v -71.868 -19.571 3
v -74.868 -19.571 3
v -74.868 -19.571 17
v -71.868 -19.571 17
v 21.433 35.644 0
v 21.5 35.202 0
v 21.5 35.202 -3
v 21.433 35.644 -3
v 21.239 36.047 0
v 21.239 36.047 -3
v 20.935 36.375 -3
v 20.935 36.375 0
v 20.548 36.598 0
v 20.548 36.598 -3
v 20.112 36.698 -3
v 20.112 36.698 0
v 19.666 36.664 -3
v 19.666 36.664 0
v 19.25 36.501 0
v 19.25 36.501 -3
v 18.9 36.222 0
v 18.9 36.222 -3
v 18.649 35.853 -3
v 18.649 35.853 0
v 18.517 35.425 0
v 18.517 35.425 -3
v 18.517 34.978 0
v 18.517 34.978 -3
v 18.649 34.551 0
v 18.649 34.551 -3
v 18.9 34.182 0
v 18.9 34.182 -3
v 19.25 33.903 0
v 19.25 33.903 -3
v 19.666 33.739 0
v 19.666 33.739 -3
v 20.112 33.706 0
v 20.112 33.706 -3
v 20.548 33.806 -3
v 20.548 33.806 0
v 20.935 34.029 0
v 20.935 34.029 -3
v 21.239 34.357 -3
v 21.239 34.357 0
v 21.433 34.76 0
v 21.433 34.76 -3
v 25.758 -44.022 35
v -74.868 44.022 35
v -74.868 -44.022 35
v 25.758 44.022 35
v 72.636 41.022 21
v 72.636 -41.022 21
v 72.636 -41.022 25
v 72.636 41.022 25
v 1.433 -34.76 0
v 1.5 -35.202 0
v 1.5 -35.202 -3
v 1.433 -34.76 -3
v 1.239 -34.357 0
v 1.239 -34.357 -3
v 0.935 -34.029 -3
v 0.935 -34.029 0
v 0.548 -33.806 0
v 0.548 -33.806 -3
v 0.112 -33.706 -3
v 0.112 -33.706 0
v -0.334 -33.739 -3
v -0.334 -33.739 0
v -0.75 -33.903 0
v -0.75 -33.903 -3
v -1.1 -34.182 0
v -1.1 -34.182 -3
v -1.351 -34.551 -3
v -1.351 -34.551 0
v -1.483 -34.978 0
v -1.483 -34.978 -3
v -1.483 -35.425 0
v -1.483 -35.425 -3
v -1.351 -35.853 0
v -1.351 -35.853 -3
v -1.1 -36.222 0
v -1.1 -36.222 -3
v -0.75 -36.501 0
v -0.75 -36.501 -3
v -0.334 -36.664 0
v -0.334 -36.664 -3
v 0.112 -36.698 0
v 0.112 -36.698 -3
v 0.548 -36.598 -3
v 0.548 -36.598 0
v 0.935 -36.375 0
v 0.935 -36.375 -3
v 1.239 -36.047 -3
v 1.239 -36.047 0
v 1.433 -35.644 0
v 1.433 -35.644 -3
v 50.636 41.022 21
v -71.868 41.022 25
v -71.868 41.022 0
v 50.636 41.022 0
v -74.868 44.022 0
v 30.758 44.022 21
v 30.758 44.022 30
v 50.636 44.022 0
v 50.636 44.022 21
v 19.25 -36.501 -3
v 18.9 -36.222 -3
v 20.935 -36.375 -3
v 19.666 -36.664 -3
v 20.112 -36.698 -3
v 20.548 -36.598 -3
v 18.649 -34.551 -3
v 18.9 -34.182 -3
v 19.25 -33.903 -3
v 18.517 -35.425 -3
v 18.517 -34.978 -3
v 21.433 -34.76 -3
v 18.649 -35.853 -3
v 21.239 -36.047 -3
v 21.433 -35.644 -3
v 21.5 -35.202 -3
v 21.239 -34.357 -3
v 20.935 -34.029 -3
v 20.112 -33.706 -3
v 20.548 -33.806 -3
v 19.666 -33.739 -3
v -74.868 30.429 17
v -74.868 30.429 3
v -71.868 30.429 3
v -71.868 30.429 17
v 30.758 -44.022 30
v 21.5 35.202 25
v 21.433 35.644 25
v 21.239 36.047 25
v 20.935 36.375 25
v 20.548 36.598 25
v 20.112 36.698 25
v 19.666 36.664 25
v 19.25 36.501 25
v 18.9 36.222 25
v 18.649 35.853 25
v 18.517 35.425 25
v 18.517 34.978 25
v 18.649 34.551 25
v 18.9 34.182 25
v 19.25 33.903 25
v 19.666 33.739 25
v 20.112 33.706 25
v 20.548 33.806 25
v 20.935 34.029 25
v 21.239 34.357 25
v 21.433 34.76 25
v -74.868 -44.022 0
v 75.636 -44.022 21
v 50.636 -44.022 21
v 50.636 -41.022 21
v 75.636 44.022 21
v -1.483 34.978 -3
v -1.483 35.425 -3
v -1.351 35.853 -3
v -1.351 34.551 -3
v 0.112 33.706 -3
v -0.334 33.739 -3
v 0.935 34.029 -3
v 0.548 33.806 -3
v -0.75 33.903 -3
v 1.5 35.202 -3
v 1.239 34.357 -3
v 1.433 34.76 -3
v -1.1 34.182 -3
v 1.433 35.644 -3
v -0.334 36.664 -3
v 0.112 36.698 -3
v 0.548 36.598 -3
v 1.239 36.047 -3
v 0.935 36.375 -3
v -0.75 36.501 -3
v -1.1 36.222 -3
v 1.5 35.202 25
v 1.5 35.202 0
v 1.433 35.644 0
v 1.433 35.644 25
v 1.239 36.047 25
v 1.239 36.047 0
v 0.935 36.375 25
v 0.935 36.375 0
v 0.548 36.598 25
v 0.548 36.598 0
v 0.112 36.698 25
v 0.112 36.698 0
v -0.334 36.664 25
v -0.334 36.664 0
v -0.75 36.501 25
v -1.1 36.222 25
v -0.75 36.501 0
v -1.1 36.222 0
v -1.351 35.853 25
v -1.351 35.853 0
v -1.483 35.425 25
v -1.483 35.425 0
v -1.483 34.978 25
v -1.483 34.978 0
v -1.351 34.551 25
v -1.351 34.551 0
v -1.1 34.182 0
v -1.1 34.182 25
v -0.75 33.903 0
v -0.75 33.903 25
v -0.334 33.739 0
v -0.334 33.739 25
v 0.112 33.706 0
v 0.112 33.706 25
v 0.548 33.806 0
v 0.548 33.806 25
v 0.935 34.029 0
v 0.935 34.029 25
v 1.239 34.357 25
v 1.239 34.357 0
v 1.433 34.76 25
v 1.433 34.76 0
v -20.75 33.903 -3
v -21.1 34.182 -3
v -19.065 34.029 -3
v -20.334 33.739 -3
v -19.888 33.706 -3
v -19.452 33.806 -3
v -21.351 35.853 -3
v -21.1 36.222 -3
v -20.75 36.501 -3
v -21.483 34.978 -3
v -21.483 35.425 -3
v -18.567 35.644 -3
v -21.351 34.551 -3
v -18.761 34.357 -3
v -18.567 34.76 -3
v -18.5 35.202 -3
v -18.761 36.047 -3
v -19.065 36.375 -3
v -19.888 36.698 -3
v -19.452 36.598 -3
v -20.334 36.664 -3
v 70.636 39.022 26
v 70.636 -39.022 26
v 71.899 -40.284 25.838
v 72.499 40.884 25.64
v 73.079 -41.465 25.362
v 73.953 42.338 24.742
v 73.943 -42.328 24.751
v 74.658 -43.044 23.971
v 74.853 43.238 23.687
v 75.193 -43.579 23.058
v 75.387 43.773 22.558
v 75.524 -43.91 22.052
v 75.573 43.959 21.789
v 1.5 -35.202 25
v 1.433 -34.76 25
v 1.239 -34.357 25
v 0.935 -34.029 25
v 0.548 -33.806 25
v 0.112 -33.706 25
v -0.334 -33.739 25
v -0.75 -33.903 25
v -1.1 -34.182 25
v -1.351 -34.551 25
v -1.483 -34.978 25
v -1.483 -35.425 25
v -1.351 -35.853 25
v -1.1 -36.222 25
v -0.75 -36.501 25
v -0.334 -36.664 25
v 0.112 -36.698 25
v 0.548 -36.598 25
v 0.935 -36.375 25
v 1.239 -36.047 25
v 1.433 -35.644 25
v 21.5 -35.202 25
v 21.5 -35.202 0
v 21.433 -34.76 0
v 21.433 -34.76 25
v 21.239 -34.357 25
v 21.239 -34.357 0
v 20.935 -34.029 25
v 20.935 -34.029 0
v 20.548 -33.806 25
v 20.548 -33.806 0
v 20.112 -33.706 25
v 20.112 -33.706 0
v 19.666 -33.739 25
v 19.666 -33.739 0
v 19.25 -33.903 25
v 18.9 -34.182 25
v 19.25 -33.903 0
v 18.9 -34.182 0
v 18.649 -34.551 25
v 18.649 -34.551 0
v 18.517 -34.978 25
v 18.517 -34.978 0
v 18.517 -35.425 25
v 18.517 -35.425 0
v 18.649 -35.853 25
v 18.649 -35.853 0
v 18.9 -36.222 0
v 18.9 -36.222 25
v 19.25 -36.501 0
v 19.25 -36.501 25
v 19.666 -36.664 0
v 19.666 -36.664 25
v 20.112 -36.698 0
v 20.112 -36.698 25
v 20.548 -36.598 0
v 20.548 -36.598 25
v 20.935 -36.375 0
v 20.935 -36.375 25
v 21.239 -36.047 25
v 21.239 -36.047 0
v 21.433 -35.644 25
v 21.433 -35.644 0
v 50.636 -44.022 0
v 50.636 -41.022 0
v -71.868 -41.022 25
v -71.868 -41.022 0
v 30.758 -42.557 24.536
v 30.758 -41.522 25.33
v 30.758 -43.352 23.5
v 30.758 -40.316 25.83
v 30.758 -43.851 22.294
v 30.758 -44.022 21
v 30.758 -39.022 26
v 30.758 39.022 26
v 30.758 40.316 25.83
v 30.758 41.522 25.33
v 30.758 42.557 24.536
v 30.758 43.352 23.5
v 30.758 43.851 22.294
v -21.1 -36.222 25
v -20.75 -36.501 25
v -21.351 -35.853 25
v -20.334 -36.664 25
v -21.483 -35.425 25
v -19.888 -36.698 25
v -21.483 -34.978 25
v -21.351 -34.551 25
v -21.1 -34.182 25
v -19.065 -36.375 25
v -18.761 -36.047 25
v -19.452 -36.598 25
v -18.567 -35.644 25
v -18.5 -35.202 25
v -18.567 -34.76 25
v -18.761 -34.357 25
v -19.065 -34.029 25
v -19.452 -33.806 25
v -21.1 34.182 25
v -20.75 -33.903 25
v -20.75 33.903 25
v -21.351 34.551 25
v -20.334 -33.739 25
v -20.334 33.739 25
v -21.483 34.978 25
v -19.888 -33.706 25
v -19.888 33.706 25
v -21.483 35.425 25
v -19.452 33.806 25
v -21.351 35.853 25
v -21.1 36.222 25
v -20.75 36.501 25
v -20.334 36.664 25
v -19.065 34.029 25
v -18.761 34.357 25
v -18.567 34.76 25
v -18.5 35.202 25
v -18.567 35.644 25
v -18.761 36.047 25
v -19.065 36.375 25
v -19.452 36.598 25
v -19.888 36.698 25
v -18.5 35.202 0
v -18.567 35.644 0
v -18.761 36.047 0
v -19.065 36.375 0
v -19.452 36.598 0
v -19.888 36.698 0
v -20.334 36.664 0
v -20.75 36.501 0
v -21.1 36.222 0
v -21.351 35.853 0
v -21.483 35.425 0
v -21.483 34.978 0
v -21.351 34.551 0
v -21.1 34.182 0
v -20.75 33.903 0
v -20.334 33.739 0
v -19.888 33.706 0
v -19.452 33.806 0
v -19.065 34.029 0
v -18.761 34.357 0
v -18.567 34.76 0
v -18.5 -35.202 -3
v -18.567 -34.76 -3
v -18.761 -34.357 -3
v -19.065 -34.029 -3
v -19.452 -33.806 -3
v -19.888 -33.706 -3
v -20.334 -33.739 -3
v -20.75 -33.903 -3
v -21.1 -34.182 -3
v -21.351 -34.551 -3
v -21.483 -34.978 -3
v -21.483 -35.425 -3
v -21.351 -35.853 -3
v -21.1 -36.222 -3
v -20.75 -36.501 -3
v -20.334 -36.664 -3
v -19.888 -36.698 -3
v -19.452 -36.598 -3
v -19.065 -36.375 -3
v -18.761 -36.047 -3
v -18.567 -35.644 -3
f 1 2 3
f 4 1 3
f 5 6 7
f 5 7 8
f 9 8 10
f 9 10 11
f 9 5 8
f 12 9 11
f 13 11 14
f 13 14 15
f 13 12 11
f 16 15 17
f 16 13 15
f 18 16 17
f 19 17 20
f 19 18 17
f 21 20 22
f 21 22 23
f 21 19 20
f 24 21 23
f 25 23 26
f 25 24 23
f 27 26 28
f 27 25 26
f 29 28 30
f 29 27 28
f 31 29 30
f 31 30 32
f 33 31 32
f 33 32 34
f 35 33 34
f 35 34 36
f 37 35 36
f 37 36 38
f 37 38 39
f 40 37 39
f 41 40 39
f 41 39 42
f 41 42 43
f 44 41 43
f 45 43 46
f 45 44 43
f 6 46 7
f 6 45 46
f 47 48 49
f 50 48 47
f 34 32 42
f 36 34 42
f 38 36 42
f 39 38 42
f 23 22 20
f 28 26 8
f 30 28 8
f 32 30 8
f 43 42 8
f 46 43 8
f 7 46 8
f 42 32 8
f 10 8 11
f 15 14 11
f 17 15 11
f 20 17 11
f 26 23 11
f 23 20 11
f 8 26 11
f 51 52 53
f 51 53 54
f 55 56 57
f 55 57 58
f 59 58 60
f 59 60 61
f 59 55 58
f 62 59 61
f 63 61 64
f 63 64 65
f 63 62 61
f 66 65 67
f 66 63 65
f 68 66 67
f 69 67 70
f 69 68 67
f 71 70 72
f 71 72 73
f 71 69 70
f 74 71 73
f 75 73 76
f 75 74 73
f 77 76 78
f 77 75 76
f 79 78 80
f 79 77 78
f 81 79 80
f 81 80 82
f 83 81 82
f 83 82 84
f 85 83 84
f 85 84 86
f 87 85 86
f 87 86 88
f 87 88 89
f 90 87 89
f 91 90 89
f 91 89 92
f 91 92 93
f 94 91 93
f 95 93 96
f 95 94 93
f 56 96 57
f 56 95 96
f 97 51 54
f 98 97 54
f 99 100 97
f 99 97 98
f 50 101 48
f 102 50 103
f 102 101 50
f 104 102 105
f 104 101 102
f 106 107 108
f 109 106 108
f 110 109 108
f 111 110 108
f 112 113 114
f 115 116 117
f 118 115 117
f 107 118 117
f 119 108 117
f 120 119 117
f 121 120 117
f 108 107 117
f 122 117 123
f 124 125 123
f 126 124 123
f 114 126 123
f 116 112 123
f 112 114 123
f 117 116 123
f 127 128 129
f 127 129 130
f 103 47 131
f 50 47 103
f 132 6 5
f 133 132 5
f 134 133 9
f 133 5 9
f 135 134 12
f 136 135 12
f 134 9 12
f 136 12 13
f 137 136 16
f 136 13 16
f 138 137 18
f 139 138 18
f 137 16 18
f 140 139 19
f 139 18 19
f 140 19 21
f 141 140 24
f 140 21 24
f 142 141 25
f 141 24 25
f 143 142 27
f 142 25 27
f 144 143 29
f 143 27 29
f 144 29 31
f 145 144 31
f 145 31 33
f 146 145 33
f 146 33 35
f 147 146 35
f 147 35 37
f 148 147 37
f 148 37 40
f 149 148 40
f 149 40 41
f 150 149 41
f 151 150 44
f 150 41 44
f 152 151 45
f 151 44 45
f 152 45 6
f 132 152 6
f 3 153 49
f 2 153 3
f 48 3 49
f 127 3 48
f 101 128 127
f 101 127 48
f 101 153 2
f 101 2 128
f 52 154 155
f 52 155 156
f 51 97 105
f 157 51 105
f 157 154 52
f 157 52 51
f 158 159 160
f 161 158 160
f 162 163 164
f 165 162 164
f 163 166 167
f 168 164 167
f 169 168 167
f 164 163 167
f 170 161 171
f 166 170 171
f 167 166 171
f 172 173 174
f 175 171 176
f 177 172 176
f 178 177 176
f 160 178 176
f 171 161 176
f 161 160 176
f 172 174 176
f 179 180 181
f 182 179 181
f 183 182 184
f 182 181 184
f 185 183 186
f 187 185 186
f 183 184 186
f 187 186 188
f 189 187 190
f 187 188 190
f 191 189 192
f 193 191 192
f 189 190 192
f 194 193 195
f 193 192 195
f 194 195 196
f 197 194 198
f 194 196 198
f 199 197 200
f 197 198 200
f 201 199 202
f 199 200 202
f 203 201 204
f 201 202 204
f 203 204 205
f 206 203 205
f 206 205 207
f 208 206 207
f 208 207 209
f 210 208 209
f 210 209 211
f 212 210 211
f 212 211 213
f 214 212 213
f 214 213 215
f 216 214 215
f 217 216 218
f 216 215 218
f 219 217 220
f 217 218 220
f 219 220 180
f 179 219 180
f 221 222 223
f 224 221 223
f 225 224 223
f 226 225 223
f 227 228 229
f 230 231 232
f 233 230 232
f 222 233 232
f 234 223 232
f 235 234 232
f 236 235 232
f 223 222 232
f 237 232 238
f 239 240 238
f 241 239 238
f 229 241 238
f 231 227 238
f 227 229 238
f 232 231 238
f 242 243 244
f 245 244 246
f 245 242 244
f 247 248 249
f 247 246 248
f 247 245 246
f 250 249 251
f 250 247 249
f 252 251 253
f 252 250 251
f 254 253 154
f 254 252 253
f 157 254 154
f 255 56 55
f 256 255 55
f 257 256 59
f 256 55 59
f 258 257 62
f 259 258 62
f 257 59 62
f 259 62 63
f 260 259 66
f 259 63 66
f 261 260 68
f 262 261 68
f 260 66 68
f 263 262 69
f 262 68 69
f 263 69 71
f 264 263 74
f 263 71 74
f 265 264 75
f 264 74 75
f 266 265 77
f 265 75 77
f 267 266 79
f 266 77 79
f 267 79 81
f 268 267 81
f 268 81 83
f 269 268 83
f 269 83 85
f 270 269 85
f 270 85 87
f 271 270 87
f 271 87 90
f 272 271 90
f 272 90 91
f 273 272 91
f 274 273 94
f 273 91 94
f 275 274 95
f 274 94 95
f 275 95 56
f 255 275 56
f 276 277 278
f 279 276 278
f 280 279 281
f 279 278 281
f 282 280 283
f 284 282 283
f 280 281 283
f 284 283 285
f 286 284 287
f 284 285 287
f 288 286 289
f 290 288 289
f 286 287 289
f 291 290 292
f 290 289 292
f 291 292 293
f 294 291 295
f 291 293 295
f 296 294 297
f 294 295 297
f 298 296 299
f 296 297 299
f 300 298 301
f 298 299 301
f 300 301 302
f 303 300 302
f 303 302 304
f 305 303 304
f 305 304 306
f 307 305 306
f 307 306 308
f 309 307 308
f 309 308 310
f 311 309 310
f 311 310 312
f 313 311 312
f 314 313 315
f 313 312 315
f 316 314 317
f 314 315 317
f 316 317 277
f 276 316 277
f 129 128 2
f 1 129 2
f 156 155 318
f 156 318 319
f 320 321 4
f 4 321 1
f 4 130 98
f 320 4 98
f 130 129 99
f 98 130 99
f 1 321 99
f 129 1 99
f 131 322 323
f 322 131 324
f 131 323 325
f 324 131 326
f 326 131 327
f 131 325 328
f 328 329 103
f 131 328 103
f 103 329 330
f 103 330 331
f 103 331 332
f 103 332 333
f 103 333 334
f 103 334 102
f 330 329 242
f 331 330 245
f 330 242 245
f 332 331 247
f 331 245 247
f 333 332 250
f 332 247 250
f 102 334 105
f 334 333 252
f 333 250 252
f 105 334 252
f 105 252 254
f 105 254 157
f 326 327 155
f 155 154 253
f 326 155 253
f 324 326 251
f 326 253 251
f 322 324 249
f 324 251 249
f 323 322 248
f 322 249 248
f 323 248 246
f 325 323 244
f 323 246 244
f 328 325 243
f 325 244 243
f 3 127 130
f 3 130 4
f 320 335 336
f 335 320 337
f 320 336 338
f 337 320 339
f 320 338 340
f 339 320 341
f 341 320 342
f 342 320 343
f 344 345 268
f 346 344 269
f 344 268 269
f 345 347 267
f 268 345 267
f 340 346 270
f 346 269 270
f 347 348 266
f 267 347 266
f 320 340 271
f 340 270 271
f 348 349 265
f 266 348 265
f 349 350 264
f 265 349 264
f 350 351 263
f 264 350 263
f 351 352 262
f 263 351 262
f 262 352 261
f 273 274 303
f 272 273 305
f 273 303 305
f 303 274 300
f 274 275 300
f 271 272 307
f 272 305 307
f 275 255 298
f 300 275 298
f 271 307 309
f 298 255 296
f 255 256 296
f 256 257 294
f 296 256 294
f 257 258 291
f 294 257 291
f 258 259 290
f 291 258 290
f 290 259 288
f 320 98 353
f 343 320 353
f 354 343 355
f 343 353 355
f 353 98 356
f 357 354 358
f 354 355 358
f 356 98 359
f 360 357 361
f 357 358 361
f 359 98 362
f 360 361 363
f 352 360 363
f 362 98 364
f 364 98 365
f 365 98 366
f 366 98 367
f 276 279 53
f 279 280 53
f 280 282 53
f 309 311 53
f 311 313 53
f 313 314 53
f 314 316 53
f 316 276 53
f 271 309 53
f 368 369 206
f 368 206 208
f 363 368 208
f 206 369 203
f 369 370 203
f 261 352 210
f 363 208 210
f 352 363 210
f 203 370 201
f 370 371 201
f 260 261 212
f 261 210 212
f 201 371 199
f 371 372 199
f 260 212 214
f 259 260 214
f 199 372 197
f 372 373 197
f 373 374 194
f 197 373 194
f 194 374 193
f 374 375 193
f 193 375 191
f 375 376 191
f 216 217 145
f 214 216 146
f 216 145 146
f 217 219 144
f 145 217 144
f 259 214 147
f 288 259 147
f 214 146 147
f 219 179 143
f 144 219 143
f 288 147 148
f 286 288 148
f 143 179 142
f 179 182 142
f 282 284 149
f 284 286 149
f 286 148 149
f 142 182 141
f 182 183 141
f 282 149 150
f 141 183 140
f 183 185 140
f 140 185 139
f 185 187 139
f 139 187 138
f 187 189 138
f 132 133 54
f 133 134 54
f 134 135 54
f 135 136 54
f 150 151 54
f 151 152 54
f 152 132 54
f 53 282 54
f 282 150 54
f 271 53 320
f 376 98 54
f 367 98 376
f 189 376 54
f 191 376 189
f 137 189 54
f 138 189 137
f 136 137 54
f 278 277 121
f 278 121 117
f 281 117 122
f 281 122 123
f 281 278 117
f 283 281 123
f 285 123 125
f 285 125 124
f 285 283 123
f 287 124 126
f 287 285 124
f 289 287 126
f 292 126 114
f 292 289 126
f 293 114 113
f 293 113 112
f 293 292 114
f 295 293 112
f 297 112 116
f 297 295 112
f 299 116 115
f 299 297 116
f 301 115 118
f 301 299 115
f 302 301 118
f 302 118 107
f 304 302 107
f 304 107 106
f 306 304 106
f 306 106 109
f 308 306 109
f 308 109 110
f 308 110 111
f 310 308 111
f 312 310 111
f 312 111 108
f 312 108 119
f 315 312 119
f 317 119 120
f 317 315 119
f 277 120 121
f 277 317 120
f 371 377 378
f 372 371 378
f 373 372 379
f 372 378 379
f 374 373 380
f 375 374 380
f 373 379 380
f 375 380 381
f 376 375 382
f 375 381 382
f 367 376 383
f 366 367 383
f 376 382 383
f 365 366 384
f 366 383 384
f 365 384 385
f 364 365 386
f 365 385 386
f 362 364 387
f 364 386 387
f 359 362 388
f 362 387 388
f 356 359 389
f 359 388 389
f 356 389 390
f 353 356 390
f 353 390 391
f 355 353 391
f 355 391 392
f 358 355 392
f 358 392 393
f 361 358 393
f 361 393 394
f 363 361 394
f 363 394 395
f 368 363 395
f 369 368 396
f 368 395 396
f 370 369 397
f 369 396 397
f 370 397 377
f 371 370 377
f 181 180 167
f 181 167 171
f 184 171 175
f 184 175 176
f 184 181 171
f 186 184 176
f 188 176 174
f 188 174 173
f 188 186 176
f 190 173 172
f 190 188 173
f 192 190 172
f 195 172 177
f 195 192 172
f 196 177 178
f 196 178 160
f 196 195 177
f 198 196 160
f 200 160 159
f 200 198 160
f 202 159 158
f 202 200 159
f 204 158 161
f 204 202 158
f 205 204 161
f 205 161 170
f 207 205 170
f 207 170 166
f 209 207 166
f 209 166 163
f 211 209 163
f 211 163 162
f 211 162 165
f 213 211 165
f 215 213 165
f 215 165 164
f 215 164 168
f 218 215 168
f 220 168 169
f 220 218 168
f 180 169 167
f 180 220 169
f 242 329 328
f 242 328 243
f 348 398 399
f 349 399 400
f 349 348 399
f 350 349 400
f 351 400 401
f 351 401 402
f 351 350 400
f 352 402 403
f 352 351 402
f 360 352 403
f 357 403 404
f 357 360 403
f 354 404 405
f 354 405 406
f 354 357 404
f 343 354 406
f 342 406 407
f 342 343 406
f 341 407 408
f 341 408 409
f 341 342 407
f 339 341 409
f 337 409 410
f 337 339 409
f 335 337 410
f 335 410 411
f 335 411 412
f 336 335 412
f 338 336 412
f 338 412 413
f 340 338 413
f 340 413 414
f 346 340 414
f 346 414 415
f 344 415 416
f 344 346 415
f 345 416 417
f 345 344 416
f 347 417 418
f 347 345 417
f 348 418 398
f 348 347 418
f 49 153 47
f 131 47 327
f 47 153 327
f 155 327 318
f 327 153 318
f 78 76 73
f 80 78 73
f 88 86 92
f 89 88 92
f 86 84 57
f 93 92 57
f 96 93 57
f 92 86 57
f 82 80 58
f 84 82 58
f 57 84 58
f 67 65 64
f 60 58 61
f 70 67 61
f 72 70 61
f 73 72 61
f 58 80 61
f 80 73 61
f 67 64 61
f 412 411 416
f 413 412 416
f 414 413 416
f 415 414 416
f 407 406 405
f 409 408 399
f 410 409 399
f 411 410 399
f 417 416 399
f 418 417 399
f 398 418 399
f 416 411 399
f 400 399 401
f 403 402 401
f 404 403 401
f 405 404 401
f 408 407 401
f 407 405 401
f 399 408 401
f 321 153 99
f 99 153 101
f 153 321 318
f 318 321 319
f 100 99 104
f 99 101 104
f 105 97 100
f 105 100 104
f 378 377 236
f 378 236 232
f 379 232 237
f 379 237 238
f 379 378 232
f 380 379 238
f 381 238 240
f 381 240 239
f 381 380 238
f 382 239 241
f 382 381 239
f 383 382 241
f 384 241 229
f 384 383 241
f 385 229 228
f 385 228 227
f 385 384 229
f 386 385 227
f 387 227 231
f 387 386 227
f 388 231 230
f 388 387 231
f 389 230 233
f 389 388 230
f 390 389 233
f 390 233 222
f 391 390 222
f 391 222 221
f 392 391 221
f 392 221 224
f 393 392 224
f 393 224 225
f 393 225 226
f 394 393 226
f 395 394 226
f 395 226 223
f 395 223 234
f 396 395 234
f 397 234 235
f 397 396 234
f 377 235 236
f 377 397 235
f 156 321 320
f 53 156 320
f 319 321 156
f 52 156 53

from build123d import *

# Parameters (mm, degrees)
F0_W          = 105.625689
F0_H          = 88.043314
F0_R          = 1.5
F1_DEPTH      = 35
F0_W_2        = 44.878527
F2_DEPTH      = 26
F3_SIZE       = 5
F4_W          = 102.581762
F4_H          = 82.043314
F4_W_2        = 41.922454
F5_DEPTH      = 25
F6_R          = 5
F7_W          = 50
F7_H          = 14
F8_DEPTH      = 3
F9_DEPTH      = 25
F9_DEPTH_BACK = 3
F10_W         = 88.043314
F10_H         = 21
F11_DEPTH     = 25


with BuildPart() as f1:
    # F0 (on Top) → F1 (new body)
    with BuildSketch(Plane.XY):
        with Locations((-22.055275, 0)):
            Rectangle(F0_W, F0_H)
        with Locations((-20, -35.20183)):
            Circle(F0_R, mode=Mode.SUBTRACT)
        with Locations((0, -35.20183)):
            Circle(F0_R, mode=Mode.SUBTRACT)
        with Locations((20, -35.20183)):
            Circle(F0_R, mode=Mode.SUBTRACT)
        with Locations((-20, 35.20183)):
            Circle(F0_R, mode=Mode.SUBTRACT)
        with Locations((0, 35.20183)):
            Circle(F0_R, mode=Mode.SUBTRACT)
        with Locations((20, 35.20183)):
            Circle(F0_R, mode=Mode.SUBTRACT)
        with Locations((-20, 35.20183)):
            Circle(F0_R)
        with Locations((0, 35.20183)):
            Circle(F0_R)
        with Locations((20, 35.20183)):
            Circle(F0_R)
        with Locations((20, -35.20183)):
            Circle(F0_R)
        with Locations((0, -35.20183)):
            Circle(F0_R)
        with Locations((-20, -35.20183)):
            Circle(F0_R)
    extrude(amount=F1_DEPTH)

    # F0 (on Top) → F2 (join)
    with BuildSketch(Plane.XY):
        with Locations((53.196832, 0)):
            Rectangle(F0_W_2, F0_H)
    extrude(amount=F2_DEPTH)

    # F3
    f3_edges = [f1.edges().sort_by_distance(p)[0] for p in [
        (30.757569, 0, 35),
    ]]
    chamfer(f3_edges, length=F3_SIZE)

    # F4 (on Top) → F5 (cut)
    with BuildSketch(Plane.XY):
        with Locations((-20.577239, 0)):
            Rectangle(F4_W, F4_H)
        with Locations((51.674869, 0)):
            Rectangle(F4_W_2, F4_H)
    extrude(amount=F5_DEPTH, mode=Mode.SUBTRACT)

    # F6
    f6_edges = [f1.edges().sort_by_distance(p)[0] for p in [
        (53.196833, -44.021657, 26),
        (75.636096, 0, 26),
        (53.196833, 44.021657, 26),
    ]]
    fillet(f6_edges, radius=F6_R)

    # F7 (on face) → F8 (cut)
    with BuildSketch(Plane(origin=(-74.86812, 0, 0), x_dir=(0, -1, 0), z_dir=(-1, 0, 0))):
        with Locations((-5.428568, 10)):
            Rectangle(F7_W, F7_H)
    extrude(amount=-F8_DEPTH, mode=Mode.SUBTRACT)

    # F0 (on Top) → F9 (join, two sides)
    with BuildSketch(Plane.XY) as f9_sk:
        with Locations((-20, -35.20183)):
            Circle(F0_R)
        with Locations((0, -35.20183)):
            Circle(F0_R)
        with Locations((20, -35.20183)):
            Circle(F0_R)
        with Locations((-20, 35.20183)):
            Circle(F0_R)
        with Locations((20, 35.20183)):
            Circle(F0_R)
        with Locations((0, 35.20183)):
            Circle(F0_R)
    extrude(amount=F9_DEPTH)
    extrude(f9_sk.sketch, amount=-F9_DEPTH_BACK)

    # F10 (on face) → F11 (cut)
    with BuildSketch(Plane.YZ.offset(75.636096)):
        with Locations((0, 10.5)):
            Rectangle(F10_W, F10_H)
    extrude(amount=-F11_DEPTH, mode=Mode.SUBTRACT)


solid = f1.part
